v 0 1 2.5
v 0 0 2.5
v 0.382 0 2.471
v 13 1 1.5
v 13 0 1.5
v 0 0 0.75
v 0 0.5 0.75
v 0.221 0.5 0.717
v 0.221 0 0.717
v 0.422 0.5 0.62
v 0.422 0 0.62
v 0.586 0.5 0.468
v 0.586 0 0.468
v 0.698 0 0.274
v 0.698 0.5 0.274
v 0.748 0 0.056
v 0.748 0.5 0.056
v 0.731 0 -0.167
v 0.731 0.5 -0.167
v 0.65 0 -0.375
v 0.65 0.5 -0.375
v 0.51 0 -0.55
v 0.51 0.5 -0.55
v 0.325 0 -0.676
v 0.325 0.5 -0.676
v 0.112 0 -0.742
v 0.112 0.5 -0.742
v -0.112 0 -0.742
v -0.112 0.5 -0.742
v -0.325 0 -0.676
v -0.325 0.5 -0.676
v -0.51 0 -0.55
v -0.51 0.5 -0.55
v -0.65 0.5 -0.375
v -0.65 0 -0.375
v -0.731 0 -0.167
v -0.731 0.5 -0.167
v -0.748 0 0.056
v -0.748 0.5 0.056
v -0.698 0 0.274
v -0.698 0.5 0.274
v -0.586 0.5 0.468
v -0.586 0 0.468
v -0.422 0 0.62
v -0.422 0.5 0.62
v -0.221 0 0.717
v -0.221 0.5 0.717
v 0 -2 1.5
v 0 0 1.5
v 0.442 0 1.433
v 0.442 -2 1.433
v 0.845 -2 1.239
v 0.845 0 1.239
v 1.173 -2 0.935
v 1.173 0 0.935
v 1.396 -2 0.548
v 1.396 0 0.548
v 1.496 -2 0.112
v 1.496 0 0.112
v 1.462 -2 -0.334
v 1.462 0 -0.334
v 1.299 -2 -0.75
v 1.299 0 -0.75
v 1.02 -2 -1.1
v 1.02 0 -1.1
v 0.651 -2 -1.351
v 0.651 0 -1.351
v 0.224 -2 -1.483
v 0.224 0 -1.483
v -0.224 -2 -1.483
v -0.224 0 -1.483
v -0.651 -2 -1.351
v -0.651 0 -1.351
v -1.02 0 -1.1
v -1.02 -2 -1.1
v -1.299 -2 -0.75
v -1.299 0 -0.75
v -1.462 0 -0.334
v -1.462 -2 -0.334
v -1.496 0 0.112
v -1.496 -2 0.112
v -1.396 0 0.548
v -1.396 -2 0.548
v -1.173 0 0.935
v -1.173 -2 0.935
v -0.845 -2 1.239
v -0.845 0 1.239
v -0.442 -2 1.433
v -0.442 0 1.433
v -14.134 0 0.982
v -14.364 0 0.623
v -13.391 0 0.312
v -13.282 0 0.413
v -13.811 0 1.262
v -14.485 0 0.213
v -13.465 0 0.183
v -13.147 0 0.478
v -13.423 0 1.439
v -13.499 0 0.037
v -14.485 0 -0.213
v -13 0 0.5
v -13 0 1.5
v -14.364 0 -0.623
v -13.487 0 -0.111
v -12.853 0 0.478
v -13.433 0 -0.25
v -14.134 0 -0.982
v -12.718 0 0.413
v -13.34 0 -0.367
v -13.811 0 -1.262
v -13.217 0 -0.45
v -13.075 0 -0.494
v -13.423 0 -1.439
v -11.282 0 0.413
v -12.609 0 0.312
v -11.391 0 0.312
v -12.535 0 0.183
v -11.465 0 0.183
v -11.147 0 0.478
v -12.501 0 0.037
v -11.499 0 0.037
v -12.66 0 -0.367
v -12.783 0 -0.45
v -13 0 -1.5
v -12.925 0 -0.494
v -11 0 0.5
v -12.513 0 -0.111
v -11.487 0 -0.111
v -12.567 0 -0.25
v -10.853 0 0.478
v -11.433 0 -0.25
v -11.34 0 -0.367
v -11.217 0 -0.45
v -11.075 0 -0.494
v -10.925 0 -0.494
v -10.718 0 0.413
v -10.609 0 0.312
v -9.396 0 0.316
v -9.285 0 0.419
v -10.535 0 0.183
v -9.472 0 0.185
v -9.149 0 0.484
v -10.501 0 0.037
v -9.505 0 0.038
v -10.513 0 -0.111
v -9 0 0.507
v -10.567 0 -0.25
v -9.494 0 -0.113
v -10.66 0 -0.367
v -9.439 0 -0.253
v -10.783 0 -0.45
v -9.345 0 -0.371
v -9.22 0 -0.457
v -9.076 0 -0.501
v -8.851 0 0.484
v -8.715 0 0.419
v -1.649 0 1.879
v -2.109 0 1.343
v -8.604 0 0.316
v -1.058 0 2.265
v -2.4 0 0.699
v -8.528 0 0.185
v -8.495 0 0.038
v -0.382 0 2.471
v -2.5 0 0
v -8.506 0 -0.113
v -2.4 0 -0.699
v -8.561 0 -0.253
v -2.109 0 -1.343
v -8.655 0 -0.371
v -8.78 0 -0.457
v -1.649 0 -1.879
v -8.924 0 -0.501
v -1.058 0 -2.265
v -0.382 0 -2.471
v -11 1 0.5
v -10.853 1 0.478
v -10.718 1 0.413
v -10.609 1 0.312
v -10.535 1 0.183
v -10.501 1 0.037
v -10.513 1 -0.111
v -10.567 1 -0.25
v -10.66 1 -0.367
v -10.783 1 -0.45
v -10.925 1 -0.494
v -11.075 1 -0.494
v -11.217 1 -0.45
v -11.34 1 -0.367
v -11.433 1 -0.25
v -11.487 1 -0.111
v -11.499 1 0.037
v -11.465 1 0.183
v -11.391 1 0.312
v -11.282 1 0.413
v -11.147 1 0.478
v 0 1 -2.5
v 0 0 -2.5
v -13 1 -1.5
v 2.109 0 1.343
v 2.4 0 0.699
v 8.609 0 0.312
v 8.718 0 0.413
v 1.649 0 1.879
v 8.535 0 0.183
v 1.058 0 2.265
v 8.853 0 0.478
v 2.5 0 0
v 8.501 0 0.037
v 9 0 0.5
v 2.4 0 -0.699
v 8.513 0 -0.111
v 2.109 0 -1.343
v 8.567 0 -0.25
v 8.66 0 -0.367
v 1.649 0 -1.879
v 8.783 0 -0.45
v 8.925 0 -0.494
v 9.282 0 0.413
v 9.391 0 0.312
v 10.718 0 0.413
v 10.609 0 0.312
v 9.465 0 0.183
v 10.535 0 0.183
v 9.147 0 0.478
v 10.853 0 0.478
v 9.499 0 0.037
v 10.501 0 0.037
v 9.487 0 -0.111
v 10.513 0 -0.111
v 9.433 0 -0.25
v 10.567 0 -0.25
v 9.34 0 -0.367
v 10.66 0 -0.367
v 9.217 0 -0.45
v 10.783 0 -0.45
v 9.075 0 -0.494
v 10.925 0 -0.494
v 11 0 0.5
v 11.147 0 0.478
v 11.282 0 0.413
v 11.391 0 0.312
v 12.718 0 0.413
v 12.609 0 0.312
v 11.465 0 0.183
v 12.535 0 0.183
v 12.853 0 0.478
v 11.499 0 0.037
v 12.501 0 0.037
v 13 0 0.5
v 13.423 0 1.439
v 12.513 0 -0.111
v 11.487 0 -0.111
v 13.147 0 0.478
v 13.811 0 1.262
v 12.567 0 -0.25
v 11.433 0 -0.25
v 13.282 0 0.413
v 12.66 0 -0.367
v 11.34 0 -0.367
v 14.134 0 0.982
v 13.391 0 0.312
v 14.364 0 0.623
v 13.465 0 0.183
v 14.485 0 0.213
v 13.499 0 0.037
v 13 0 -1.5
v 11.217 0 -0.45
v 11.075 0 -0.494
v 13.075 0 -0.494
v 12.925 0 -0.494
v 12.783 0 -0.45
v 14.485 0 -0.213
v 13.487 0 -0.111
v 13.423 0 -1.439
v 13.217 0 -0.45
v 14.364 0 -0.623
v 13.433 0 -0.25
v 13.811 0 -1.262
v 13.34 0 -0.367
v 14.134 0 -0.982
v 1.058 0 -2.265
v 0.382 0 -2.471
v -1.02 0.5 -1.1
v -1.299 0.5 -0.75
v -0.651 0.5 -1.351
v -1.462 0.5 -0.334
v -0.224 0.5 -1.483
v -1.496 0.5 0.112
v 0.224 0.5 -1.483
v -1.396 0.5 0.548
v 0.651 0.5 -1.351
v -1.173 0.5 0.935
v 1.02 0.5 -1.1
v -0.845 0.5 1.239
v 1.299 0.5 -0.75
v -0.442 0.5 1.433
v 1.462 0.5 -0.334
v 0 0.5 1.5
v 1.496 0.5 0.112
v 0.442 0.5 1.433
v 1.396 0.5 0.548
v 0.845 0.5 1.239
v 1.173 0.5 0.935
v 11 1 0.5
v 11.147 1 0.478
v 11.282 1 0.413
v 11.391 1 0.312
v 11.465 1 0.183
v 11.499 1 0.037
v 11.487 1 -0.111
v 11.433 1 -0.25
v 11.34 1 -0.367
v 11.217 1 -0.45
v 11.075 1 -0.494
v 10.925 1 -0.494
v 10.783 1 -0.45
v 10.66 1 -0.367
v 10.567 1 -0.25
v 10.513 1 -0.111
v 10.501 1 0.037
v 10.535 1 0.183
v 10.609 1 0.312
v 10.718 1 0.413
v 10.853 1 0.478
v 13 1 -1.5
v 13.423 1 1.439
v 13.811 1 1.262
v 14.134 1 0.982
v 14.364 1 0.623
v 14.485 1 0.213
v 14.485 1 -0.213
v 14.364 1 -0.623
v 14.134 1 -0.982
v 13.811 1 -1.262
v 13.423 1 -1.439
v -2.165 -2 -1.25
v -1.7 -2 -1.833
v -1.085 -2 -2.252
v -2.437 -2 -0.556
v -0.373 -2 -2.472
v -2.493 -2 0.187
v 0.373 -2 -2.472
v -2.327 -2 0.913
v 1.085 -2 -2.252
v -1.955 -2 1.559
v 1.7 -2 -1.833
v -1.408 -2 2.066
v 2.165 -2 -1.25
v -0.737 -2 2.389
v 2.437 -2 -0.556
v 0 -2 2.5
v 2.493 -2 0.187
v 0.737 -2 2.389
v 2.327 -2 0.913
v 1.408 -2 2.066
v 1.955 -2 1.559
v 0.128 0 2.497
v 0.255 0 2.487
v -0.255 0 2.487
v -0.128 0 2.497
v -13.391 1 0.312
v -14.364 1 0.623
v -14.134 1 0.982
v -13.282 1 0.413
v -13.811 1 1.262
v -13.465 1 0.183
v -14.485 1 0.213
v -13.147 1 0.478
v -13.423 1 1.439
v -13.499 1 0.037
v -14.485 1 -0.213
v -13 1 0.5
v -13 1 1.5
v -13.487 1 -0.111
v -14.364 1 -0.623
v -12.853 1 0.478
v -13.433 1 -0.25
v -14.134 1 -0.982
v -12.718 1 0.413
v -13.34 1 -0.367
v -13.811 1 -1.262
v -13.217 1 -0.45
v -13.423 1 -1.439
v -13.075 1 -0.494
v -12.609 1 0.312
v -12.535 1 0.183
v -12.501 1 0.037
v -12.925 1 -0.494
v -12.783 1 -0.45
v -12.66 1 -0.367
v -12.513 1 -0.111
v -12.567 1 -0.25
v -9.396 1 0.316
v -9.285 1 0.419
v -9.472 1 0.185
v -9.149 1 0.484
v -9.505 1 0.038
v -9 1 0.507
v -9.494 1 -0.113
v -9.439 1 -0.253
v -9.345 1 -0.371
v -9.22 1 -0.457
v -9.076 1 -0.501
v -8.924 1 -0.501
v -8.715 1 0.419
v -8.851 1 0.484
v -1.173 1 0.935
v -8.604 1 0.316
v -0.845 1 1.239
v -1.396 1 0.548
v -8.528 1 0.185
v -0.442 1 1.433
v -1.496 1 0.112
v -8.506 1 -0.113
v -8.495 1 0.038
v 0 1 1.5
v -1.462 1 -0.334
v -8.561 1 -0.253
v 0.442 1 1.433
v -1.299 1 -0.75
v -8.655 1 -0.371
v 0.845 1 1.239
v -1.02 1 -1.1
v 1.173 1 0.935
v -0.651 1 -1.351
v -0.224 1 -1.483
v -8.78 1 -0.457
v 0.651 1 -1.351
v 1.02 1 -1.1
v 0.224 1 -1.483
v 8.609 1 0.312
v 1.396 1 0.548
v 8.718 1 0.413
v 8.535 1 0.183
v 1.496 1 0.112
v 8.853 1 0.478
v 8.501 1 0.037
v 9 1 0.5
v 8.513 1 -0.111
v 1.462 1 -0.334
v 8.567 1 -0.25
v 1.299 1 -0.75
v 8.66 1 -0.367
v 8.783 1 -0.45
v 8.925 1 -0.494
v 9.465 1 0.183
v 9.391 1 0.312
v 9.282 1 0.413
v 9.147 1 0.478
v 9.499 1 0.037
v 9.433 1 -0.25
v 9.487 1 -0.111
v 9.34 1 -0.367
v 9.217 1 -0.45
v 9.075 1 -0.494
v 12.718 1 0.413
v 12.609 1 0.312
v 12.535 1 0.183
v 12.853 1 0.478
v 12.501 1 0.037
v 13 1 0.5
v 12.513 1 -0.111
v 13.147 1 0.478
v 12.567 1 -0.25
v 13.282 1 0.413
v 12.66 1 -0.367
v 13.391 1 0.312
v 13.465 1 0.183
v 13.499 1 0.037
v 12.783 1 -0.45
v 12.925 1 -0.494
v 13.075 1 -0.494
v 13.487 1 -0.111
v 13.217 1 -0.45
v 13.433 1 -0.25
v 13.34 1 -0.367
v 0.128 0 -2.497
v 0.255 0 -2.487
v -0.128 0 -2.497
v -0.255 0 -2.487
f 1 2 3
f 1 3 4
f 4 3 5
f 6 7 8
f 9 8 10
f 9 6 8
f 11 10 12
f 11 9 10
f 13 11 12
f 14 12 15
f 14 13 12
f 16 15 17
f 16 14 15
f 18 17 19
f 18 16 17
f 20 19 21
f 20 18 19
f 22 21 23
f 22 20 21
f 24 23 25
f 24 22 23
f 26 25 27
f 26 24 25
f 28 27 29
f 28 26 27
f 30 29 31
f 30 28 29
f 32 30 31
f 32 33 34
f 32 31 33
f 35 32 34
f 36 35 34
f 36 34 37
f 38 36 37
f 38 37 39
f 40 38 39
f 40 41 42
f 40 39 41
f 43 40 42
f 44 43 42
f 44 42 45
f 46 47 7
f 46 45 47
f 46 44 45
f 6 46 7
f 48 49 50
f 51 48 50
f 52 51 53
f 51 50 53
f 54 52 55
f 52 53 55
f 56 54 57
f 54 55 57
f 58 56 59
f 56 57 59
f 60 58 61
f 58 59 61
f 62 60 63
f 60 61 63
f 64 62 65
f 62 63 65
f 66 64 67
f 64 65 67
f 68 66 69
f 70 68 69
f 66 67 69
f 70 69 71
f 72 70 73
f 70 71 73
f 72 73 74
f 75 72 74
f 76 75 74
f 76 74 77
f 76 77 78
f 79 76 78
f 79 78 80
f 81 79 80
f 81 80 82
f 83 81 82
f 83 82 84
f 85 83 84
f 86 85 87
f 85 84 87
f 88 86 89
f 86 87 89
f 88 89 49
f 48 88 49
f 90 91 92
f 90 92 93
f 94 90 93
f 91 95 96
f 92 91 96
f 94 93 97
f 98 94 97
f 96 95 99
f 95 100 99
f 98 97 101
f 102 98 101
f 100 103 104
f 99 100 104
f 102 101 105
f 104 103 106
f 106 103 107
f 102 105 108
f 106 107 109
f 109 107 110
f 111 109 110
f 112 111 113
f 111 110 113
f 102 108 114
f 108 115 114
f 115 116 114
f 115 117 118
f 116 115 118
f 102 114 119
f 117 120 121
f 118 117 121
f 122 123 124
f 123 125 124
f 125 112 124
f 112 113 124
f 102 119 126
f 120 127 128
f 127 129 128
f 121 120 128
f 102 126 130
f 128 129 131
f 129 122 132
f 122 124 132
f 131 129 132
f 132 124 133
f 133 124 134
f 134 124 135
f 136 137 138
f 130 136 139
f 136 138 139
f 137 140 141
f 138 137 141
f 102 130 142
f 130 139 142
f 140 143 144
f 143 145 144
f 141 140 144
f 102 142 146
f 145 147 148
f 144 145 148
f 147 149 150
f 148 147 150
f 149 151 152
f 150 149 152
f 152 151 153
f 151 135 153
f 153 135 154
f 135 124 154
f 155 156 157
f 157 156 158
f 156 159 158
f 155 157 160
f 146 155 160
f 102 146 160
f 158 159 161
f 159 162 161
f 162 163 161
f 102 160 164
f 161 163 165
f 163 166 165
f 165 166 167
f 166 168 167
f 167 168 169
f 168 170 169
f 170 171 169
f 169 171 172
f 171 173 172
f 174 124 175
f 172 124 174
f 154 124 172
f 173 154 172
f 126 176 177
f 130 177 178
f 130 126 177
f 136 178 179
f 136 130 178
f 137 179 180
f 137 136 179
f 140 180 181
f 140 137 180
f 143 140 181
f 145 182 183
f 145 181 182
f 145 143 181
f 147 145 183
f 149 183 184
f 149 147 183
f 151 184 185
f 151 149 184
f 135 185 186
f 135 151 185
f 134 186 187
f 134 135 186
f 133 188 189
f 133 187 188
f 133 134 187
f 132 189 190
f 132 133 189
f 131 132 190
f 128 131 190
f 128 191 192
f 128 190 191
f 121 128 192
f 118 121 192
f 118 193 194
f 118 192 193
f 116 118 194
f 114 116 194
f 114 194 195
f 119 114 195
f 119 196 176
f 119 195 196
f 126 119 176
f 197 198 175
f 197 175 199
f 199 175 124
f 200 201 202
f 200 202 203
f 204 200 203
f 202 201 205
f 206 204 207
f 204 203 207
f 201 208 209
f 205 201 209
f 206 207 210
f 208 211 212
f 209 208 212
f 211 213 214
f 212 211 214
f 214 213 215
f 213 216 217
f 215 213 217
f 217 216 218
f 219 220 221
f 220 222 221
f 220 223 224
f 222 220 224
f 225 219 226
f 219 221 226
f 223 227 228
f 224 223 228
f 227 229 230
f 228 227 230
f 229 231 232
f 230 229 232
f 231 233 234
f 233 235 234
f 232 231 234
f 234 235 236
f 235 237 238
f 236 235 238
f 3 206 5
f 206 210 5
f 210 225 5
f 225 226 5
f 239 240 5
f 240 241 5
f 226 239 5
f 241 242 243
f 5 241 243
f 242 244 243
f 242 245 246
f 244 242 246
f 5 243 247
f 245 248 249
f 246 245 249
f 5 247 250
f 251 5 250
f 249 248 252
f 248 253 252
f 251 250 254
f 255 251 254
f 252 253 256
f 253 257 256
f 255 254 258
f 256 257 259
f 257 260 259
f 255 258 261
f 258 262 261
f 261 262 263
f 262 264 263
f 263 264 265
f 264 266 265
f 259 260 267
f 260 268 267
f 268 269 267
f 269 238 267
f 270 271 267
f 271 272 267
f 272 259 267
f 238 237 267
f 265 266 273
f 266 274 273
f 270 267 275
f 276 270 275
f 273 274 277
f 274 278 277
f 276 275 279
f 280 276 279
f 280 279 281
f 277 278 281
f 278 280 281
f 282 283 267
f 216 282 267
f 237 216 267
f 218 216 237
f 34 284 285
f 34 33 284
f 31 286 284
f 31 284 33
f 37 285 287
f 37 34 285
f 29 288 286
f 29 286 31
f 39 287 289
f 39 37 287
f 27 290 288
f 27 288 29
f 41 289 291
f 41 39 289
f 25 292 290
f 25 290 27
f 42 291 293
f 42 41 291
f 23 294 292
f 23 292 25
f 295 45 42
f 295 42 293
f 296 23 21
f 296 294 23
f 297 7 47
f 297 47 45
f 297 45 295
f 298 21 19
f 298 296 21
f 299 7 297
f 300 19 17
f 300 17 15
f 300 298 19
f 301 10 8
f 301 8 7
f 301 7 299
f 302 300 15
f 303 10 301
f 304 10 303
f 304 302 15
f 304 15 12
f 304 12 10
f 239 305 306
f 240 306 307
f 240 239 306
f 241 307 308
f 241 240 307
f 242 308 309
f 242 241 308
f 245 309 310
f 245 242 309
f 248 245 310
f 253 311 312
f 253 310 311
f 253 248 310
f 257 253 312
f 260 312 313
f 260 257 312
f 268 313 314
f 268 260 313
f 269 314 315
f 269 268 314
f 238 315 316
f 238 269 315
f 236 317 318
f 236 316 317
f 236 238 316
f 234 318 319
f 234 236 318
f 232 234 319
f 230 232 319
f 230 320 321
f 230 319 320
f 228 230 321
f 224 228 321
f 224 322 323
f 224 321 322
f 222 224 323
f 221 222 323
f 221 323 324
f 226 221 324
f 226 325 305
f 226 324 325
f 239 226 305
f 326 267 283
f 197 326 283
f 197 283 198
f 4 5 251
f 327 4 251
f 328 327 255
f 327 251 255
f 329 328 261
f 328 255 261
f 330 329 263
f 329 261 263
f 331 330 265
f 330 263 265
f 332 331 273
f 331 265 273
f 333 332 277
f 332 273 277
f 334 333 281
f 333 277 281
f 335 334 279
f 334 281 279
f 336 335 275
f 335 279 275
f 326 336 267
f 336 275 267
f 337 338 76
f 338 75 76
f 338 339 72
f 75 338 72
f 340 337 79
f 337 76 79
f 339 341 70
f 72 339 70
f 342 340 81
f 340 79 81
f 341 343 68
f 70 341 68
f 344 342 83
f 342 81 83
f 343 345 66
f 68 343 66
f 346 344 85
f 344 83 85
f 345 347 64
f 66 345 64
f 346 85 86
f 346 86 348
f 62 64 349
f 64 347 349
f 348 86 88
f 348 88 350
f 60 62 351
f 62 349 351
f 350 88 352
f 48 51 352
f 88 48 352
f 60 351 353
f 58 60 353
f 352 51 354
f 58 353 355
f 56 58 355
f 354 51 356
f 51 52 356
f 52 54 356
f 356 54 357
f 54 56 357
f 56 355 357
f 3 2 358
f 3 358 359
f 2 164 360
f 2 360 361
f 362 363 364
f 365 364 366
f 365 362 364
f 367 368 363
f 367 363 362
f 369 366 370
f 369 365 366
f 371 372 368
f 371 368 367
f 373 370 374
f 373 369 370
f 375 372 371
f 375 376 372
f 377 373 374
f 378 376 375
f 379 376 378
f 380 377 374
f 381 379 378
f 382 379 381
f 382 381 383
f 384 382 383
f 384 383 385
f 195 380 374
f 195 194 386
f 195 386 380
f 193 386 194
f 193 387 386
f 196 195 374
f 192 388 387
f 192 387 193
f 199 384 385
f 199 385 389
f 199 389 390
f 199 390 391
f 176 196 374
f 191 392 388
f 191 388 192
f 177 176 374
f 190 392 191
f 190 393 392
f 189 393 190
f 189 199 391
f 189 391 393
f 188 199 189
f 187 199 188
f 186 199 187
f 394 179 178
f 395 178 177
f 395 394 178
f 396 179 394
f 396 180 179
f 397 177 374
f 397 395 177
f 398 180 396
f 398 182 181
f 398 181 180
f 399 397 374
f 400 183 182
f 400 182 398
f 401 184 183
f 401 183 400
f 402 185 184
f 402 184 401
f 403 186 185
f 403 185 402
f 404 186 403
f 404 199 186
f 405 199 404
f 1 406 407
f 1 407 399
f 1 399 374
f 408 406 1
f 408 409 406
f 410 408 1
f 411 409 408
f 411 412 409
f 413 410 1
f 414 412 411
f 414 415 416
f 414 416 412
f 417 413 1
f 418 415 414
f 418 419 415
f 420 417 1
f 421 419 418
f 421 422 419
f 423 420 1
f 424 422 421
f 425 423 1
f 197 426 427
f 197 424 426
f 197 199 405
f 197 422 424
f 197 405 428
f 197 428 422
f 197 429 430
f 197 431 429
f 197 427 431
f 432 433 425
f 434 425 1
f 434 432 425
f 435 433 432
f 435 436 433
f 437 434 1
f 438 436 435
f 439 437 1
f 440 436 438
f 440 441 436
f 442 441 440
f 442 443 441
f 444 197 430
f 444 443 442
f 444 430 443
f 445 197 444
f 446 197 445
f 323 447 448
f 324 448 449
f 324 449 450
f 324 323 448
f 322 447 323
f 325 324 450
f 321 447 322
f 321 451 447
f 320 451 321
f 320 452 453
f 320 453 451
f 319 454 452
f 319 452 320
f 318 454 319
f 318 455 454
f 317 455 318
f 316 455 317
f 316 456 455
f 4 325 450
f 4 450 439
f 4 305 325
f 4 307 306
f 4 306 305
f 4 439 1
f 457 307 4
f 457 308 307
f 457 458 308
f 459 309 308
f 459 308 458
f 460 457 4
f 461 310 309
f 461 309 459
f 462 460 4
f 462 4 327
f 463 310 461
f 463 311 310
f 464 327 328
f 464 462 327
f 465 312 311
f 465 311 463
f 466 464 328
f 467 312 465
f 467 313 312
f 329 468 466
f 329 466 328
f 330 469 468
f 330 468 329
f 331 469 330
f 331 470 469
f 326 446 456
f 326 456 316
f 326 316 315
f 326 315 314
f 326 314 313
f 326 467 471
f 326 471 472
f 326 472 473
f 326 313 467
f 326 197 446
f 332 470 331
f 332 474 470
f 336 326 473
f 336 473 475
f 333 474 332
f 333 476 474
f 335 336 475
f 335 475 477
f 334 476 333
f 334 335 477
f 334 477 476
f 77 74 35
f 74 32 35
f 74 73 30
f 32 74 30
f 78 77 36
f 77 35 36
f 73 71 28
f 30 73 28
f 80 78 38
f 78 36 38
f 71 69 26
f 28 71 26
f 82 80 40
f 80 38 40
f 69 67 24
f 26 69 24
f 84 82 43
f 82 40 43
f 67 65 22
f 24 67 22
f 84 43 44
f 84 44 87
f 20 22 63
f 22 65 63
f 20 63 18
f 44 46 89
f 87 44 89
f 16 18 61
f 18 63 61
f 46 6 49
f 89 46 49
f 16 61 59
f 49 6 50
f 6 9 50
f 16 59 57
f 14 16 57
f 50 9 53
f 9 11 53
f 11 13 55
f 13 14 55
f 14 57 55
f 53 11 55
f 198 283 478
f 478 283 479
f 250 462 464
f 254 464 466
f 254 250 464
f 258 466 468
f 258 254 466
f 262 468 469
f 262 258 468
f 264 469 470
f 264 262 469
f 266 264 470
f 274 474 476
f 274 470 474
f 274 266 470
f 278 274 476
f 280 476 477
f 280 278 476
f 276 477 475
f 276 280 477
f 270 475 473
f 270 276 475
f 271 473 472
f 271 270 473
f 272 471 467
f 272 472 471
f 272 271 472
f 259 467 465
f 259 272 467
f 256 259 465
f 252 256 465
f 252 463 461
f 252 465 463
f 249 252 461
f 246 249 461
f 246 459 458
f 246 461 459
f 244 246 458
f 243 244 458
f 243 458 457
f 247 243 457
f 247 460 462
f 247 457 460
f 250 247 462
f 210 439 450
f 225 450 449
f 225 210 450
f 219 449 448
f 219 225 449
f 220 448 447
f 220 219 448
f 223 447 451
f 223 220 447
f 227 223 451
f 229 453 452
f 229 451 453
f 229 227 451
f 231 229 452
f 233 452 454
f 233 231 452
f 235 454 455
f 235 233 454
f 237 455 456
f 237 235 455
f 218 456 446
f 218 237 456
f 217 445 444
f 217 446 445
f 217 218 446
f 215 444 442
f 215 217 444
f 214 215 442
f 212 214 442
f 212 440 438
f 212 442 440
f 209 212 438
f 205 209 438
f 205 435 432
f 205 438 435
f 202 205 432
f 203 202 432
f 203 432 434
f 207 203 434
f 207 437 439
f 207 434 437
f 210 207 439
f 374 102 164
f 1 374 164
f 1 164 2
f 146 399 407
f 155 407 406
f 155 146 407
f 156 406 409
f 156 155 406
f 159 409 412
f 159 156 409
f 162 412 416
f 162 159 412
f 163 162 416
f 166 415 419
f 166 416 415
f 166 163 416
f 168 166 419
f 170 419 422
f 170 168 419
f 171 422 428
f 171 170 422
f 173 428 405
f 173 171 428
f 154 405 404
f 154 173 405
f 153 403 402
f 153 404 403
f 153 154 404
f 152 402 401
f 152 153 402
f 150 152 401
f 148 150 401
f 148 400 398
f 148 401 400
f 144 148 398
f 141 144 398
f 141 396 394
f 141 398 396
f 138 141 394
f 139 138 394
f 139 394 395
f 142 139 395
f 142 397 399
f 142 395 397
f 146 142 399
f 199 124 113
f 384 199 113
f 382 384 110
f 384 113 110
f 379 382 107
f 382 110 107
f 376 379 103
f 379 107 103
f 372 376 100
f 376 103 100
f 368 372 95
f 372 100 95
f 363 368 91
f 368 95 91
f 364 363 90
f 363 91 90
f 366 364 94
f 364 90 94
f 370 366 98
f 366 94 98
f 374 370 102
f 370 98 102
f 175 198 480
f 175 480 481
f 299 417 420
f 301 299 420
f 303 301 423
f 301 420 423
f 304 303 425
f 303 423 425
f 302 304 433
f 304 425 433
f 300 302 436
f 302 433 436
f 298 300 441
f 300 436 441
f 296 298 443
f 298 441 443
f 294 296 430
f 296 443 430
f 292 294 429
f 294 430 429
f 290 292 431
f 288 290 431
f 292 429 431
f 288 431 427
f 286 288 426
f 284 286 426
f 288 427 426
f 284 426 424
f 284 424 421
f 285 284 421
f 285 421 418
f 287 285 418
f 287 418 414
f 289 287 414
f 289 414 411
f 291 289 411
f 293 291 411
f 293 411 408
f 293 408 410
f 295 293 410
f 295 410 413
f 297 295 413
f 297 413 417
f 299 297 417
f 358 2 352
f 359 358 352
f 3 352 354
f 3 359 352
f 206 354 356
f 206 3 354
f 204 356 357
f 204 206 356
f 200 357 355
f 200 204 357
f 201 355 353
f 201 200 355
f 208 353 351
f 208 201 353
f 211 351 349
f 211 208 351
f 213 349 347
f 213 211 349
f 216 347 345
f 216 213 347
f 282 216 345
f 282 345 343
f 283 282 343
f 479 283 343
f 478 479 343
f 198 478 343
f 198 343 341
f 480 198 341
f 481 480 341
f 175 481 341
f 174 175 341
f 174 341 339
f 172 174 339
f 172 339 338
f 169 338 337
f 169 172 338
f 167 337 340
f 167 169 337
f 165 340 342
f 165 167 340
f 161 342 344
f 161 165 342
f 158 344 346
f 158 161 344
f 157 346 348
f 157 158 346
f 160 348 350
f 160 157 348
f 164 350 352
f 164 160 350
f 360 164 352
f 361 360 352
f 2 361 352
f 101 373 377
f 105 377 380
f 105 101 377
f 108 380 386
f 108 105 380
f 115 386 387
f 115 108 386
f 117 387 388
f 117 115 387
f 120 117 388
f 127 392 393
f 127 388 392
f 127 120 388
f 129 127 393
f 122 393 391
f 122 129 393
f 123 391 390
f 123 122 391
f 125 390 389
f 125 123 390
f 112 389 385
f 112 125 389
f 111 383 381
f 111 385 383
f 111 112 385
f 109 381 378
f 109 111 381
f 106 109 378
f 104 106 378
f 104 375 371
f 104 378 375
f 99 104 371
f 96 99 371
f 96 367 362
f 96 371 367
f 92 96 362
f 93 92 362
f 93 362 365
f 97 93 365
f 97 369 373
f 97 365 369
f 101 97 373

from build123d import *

# Parameters (mm, degrees)
EXTRUDE_2_DEPTH     = 1
SKETCH_2_R          = 2.5
EXTRUDE_3_DEPTH     = 2
SKETCH_3_R          = 1.5
CUT_EXTRUDE_1_DEPTH = 2
SKETCH_4_R          = 0.75
CUT_EXTRUDE_2_DEPTH = 2
CUT_EXTRUDE_START   = 2.5
SKETCH_5_R          = 1.5
CUT_EXTRUDE_3_DEPTH = 2
SKETCH_6_R          = 0.5
SKETCH_6_R_2        = 0.506721332
CUT_EXTRUDE_6_DEPTH = 2


with BuildPart() as part:
    # 草图1 → 凸台-拉伸2 (new body)
    with BuildSketch(Plane(origin=(0, 0, 0), x_dir=(1, 0, 0), z_dir=(0, 1, 0))):
        with BuildLine():
            ThreePointArc((-13, 1.5), (-14.5, 0), (-13, -1.5))
            Line((-13, -1.5), (0, -2.5))
            Line((0, -2.5), (13, -1.5))
            ThreePointArc((13, -1.5), (14.5, 0), (13, 1.5))
            Line((13, 1.5), (0, 2.5))
            Line((0, 2.5), (-13, 1.5))
        make_face()
    extrude(amount=EXTRUDE_2_DEPTH)

    # 草图2 → 凸台-拉伸3 (add)
    with BuildSketch(Plane(origin=(0, 0, 0), x_dir=(1, 0, 0), z_dir=(0, 1, 0))):
        with Locations(Location((0, 0, 0), (0, 0, 270))):
            Circle(SKETCH_2_R)
    extrude(amount=-EXTRUDE_3_DEPTH)

    # 草图3 → 切除-拉伸1 (cut)
    with BuildSketch(Plane(origin=(0, 0, 0), x_dir=(1, 0, 0), z_dir=(0, 1, 0))):
        with Locations(Location((0, 0, 0), (0, 0, 270))):
            Circle(SKETCH_3_R)
    extrude(amount=-CUT_EXTRUDE_1_DEPTH, mode=Mode.SUBTRACT)

    # 草图4 → 切除-拉伸2 (cut)
    with BuildSketch(Plane(origin=(0, 0, 0), x_dir=(1, 0, 0), z_dir=(0, 1, 0))):
        with Locations(Location((0, 0, 0), (0, 0, 270))):
            Circle(SKETCH_4_R)
    extrude(amount=CUT_EXTRUDE_2_DEPTH, mode=Mode.SUBTRACT)

    # 草图5 → 切除-拉伸3 (cut)
    with BuildSketch(Plane(origin=(0, 0, 0), x_dir=(1, 0, 0), z_dir=(0, 1, 0)).offset(CUT_EXTRUDE_START)):
        with Locations(Location((0, 0, 0), (0, 0, 270))):
            Circle(SKETCH_5_R)
    extrude(amount=-CUT_EXTRUDE_3_DEPTH, mode=Mode.SUBTRACT)

    # 草图6 → 切除-拉伸6 (cut)
    with BuildSketch(Plane(origin=(0, 0, 0), x_dir=(1, 0, 0), z_dir=(0, 1, 0))):
        with Locations(Location((13, 0, 0), (0, 0, 270))):
            Circle(SKETCH_6_R)
        with Locations(Location((-13, 0, 0), (0, 0, 270))):
            Circle(SKETCH_6_R)
        with Locations(Location((11, 0, 0), (0, 0, 270))):
            Circle(SKETCH_6_R)
        with Locations(Location((9, 0, 0), (0, 0, 270))):
            Circle(SKETCH_6_R)
        with Locations(Location((-11, 0, 0), (0, 0, 270))):
            Circle(SKETCH_6_R)
        with Locations(Location((-9, 0, 0), (0, 0, 270))):
            Circle(SKETCH_6_R_2)
    extrude(amount=CUT_EXTRUDE_6_DEPTH, mode=Mode.SUBTRACT)


solid = part.part
